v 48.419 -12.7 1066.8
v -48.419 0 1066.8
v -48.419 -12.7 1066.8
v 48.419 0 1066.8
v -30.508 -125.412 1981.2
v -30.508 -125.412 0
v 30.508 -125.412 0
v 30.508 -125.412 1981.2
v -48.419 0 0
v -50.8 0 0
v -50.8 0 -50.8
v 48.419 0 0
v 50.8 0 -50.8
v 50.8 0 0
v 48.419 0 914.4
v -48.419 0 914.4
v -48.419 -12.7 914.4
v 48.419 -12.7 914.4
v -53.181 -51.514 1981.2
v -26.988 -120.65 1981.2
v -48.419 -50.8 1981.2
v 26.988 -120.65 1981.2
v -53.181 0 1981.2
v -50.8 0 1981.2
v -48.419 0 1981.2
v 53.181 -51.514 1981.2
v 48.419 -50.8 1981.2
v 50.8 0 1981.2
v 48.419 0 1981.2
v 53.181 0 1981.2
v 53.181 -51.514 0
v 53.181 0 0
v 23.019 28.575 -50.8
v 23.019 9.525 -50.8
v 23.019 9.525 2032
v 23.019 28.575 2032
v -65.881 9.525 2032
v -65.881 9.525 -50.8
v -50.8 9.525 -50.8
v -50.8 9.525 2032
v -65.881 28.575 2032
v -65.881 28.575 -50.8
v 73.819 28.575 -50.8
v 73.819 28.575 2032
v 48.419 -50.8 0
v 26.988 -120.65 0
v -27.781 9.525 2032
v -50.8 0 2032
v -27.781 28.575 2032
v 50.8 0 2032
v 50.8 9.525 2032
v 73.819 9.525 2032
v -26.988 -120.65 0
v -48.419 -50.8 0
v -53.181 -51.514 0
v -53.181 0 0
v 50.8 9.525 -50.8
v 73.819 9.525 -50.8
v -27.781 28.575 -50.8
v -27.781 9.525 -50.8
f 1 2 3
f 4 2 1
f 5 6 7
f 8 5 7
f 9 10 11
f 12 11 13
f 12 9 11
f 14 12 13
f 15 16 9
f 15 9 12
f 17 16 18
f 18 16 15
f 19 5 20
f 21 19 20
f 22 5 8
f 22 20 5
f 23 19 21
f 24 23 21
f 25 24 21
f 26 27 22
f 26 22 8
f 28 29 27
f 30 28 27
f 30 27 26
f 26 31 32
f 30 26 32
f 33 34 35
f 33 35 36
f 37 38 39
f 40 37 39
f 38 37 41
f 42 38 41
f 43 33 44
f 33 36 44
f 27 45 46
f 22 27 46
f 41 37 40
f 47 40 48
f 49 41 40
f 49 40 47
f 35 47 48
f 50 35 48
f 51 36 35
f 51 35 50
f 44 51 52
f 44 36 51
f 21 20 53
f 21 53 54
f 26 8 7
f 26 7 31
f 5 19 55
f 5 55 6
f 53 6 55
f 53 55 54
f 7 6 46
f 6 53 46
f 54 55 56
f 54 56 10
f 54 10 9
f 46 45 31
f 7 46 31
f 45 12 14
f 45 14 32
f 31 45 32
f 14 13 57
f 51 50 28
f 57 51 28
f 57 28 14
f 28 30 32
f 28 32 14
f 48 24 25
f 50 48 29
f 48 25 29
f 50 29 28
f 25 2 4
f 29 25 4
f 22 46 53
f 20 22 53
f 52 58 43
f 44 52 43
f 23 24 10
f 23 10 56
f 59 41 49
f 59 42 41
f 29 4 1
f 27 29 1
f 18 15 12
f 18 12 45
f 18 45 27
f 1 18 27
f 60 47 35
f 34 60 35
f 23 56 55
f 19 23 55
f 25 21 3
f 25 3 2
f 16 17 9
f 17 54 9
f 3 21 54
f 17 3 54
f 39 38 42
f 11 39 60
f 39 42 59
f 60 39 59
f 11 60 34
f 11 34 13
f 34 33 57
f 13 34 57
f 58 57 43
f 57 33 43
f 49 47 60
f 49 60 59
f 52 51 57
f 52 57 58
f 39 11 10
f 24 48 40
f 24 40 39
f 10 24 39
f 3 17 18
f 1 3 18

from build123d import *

# Parameters (mm, degrees)
F1_DEPTH      = 1981.2
F3_W          = 96.8375
F3_H          = 12.7
F4_DEPTH      = 76.2
F4_DEPTH_BACK = 76.2
F5_W          = 101.6
F5_H          = 9.525
F6_DEPTH      = 1041.4
F6_DEPTH_BACK = 1041.4
F7_W          = 50.8
F7_H          = 19.05
F7_W_2        = 38.099998
F8_DEPTH      = 1041.4
F8_DEPTH_BACK = 1041.4


with BuildPart() as f1:
    # F0 (on Top) → F1 (new body)
    with BuildSketch(Plane.XY):
        Polygon((-48.41875, -50.8), (-48.41875, 0), (-53.18125, 0), (-53.18125, -51.514181), (-30.507902, -125.4125), (30.507902, -125.4125), (53.18125, -51.514181), (53.18125, 0), (48.41875, 0), (48.41875, -50.8), (26.9875, -120.65), (-26.9875, -120.65), align=None)
    extrude(amount=F1_DEPTH)

    # F3 (on offset) → F4 (join, two sides)
    with BuildSketch(Plane.XY.offset(990.6)) as f4_sk:
        with Locations((0, -6.35)):
            Rectangle(F3_W, F3_H)
    extrude(amount=F4_DEPTH)
    extrude(f4_sk.sketch, amount=-F4_DEPTH_BACK)

    # F5 (on offset) → F6 (join, two sides)
    with BuildSketch(Plane.XY.offset(990.6)) as f6_sk:
        with Locations((0, 4.7625)):
            Rectangle(F5_W, F5_H)
    extrude(amount=F6_DEPTH)
    extrude(f6_sk.sketch, amount=-F6_DEPTH_BACK)

    # F7 (on offset) → F8 (join, two sides)
    with BuildSketch(Plane.XY.offset(990.6)) as f8_sk:
        with Locations((48.418748, 19.05)):
            Rectangle(F7_W, F7_H)
        with Locations((-46.831251, 19.05)):
            Rectangle(F7_W_2, F7_H)
    extrude(amount=F8_DEPTH)
    extrude(f8_sk.sketch, amount=-F8_DEPTH_BACK)


solid = f1.part
